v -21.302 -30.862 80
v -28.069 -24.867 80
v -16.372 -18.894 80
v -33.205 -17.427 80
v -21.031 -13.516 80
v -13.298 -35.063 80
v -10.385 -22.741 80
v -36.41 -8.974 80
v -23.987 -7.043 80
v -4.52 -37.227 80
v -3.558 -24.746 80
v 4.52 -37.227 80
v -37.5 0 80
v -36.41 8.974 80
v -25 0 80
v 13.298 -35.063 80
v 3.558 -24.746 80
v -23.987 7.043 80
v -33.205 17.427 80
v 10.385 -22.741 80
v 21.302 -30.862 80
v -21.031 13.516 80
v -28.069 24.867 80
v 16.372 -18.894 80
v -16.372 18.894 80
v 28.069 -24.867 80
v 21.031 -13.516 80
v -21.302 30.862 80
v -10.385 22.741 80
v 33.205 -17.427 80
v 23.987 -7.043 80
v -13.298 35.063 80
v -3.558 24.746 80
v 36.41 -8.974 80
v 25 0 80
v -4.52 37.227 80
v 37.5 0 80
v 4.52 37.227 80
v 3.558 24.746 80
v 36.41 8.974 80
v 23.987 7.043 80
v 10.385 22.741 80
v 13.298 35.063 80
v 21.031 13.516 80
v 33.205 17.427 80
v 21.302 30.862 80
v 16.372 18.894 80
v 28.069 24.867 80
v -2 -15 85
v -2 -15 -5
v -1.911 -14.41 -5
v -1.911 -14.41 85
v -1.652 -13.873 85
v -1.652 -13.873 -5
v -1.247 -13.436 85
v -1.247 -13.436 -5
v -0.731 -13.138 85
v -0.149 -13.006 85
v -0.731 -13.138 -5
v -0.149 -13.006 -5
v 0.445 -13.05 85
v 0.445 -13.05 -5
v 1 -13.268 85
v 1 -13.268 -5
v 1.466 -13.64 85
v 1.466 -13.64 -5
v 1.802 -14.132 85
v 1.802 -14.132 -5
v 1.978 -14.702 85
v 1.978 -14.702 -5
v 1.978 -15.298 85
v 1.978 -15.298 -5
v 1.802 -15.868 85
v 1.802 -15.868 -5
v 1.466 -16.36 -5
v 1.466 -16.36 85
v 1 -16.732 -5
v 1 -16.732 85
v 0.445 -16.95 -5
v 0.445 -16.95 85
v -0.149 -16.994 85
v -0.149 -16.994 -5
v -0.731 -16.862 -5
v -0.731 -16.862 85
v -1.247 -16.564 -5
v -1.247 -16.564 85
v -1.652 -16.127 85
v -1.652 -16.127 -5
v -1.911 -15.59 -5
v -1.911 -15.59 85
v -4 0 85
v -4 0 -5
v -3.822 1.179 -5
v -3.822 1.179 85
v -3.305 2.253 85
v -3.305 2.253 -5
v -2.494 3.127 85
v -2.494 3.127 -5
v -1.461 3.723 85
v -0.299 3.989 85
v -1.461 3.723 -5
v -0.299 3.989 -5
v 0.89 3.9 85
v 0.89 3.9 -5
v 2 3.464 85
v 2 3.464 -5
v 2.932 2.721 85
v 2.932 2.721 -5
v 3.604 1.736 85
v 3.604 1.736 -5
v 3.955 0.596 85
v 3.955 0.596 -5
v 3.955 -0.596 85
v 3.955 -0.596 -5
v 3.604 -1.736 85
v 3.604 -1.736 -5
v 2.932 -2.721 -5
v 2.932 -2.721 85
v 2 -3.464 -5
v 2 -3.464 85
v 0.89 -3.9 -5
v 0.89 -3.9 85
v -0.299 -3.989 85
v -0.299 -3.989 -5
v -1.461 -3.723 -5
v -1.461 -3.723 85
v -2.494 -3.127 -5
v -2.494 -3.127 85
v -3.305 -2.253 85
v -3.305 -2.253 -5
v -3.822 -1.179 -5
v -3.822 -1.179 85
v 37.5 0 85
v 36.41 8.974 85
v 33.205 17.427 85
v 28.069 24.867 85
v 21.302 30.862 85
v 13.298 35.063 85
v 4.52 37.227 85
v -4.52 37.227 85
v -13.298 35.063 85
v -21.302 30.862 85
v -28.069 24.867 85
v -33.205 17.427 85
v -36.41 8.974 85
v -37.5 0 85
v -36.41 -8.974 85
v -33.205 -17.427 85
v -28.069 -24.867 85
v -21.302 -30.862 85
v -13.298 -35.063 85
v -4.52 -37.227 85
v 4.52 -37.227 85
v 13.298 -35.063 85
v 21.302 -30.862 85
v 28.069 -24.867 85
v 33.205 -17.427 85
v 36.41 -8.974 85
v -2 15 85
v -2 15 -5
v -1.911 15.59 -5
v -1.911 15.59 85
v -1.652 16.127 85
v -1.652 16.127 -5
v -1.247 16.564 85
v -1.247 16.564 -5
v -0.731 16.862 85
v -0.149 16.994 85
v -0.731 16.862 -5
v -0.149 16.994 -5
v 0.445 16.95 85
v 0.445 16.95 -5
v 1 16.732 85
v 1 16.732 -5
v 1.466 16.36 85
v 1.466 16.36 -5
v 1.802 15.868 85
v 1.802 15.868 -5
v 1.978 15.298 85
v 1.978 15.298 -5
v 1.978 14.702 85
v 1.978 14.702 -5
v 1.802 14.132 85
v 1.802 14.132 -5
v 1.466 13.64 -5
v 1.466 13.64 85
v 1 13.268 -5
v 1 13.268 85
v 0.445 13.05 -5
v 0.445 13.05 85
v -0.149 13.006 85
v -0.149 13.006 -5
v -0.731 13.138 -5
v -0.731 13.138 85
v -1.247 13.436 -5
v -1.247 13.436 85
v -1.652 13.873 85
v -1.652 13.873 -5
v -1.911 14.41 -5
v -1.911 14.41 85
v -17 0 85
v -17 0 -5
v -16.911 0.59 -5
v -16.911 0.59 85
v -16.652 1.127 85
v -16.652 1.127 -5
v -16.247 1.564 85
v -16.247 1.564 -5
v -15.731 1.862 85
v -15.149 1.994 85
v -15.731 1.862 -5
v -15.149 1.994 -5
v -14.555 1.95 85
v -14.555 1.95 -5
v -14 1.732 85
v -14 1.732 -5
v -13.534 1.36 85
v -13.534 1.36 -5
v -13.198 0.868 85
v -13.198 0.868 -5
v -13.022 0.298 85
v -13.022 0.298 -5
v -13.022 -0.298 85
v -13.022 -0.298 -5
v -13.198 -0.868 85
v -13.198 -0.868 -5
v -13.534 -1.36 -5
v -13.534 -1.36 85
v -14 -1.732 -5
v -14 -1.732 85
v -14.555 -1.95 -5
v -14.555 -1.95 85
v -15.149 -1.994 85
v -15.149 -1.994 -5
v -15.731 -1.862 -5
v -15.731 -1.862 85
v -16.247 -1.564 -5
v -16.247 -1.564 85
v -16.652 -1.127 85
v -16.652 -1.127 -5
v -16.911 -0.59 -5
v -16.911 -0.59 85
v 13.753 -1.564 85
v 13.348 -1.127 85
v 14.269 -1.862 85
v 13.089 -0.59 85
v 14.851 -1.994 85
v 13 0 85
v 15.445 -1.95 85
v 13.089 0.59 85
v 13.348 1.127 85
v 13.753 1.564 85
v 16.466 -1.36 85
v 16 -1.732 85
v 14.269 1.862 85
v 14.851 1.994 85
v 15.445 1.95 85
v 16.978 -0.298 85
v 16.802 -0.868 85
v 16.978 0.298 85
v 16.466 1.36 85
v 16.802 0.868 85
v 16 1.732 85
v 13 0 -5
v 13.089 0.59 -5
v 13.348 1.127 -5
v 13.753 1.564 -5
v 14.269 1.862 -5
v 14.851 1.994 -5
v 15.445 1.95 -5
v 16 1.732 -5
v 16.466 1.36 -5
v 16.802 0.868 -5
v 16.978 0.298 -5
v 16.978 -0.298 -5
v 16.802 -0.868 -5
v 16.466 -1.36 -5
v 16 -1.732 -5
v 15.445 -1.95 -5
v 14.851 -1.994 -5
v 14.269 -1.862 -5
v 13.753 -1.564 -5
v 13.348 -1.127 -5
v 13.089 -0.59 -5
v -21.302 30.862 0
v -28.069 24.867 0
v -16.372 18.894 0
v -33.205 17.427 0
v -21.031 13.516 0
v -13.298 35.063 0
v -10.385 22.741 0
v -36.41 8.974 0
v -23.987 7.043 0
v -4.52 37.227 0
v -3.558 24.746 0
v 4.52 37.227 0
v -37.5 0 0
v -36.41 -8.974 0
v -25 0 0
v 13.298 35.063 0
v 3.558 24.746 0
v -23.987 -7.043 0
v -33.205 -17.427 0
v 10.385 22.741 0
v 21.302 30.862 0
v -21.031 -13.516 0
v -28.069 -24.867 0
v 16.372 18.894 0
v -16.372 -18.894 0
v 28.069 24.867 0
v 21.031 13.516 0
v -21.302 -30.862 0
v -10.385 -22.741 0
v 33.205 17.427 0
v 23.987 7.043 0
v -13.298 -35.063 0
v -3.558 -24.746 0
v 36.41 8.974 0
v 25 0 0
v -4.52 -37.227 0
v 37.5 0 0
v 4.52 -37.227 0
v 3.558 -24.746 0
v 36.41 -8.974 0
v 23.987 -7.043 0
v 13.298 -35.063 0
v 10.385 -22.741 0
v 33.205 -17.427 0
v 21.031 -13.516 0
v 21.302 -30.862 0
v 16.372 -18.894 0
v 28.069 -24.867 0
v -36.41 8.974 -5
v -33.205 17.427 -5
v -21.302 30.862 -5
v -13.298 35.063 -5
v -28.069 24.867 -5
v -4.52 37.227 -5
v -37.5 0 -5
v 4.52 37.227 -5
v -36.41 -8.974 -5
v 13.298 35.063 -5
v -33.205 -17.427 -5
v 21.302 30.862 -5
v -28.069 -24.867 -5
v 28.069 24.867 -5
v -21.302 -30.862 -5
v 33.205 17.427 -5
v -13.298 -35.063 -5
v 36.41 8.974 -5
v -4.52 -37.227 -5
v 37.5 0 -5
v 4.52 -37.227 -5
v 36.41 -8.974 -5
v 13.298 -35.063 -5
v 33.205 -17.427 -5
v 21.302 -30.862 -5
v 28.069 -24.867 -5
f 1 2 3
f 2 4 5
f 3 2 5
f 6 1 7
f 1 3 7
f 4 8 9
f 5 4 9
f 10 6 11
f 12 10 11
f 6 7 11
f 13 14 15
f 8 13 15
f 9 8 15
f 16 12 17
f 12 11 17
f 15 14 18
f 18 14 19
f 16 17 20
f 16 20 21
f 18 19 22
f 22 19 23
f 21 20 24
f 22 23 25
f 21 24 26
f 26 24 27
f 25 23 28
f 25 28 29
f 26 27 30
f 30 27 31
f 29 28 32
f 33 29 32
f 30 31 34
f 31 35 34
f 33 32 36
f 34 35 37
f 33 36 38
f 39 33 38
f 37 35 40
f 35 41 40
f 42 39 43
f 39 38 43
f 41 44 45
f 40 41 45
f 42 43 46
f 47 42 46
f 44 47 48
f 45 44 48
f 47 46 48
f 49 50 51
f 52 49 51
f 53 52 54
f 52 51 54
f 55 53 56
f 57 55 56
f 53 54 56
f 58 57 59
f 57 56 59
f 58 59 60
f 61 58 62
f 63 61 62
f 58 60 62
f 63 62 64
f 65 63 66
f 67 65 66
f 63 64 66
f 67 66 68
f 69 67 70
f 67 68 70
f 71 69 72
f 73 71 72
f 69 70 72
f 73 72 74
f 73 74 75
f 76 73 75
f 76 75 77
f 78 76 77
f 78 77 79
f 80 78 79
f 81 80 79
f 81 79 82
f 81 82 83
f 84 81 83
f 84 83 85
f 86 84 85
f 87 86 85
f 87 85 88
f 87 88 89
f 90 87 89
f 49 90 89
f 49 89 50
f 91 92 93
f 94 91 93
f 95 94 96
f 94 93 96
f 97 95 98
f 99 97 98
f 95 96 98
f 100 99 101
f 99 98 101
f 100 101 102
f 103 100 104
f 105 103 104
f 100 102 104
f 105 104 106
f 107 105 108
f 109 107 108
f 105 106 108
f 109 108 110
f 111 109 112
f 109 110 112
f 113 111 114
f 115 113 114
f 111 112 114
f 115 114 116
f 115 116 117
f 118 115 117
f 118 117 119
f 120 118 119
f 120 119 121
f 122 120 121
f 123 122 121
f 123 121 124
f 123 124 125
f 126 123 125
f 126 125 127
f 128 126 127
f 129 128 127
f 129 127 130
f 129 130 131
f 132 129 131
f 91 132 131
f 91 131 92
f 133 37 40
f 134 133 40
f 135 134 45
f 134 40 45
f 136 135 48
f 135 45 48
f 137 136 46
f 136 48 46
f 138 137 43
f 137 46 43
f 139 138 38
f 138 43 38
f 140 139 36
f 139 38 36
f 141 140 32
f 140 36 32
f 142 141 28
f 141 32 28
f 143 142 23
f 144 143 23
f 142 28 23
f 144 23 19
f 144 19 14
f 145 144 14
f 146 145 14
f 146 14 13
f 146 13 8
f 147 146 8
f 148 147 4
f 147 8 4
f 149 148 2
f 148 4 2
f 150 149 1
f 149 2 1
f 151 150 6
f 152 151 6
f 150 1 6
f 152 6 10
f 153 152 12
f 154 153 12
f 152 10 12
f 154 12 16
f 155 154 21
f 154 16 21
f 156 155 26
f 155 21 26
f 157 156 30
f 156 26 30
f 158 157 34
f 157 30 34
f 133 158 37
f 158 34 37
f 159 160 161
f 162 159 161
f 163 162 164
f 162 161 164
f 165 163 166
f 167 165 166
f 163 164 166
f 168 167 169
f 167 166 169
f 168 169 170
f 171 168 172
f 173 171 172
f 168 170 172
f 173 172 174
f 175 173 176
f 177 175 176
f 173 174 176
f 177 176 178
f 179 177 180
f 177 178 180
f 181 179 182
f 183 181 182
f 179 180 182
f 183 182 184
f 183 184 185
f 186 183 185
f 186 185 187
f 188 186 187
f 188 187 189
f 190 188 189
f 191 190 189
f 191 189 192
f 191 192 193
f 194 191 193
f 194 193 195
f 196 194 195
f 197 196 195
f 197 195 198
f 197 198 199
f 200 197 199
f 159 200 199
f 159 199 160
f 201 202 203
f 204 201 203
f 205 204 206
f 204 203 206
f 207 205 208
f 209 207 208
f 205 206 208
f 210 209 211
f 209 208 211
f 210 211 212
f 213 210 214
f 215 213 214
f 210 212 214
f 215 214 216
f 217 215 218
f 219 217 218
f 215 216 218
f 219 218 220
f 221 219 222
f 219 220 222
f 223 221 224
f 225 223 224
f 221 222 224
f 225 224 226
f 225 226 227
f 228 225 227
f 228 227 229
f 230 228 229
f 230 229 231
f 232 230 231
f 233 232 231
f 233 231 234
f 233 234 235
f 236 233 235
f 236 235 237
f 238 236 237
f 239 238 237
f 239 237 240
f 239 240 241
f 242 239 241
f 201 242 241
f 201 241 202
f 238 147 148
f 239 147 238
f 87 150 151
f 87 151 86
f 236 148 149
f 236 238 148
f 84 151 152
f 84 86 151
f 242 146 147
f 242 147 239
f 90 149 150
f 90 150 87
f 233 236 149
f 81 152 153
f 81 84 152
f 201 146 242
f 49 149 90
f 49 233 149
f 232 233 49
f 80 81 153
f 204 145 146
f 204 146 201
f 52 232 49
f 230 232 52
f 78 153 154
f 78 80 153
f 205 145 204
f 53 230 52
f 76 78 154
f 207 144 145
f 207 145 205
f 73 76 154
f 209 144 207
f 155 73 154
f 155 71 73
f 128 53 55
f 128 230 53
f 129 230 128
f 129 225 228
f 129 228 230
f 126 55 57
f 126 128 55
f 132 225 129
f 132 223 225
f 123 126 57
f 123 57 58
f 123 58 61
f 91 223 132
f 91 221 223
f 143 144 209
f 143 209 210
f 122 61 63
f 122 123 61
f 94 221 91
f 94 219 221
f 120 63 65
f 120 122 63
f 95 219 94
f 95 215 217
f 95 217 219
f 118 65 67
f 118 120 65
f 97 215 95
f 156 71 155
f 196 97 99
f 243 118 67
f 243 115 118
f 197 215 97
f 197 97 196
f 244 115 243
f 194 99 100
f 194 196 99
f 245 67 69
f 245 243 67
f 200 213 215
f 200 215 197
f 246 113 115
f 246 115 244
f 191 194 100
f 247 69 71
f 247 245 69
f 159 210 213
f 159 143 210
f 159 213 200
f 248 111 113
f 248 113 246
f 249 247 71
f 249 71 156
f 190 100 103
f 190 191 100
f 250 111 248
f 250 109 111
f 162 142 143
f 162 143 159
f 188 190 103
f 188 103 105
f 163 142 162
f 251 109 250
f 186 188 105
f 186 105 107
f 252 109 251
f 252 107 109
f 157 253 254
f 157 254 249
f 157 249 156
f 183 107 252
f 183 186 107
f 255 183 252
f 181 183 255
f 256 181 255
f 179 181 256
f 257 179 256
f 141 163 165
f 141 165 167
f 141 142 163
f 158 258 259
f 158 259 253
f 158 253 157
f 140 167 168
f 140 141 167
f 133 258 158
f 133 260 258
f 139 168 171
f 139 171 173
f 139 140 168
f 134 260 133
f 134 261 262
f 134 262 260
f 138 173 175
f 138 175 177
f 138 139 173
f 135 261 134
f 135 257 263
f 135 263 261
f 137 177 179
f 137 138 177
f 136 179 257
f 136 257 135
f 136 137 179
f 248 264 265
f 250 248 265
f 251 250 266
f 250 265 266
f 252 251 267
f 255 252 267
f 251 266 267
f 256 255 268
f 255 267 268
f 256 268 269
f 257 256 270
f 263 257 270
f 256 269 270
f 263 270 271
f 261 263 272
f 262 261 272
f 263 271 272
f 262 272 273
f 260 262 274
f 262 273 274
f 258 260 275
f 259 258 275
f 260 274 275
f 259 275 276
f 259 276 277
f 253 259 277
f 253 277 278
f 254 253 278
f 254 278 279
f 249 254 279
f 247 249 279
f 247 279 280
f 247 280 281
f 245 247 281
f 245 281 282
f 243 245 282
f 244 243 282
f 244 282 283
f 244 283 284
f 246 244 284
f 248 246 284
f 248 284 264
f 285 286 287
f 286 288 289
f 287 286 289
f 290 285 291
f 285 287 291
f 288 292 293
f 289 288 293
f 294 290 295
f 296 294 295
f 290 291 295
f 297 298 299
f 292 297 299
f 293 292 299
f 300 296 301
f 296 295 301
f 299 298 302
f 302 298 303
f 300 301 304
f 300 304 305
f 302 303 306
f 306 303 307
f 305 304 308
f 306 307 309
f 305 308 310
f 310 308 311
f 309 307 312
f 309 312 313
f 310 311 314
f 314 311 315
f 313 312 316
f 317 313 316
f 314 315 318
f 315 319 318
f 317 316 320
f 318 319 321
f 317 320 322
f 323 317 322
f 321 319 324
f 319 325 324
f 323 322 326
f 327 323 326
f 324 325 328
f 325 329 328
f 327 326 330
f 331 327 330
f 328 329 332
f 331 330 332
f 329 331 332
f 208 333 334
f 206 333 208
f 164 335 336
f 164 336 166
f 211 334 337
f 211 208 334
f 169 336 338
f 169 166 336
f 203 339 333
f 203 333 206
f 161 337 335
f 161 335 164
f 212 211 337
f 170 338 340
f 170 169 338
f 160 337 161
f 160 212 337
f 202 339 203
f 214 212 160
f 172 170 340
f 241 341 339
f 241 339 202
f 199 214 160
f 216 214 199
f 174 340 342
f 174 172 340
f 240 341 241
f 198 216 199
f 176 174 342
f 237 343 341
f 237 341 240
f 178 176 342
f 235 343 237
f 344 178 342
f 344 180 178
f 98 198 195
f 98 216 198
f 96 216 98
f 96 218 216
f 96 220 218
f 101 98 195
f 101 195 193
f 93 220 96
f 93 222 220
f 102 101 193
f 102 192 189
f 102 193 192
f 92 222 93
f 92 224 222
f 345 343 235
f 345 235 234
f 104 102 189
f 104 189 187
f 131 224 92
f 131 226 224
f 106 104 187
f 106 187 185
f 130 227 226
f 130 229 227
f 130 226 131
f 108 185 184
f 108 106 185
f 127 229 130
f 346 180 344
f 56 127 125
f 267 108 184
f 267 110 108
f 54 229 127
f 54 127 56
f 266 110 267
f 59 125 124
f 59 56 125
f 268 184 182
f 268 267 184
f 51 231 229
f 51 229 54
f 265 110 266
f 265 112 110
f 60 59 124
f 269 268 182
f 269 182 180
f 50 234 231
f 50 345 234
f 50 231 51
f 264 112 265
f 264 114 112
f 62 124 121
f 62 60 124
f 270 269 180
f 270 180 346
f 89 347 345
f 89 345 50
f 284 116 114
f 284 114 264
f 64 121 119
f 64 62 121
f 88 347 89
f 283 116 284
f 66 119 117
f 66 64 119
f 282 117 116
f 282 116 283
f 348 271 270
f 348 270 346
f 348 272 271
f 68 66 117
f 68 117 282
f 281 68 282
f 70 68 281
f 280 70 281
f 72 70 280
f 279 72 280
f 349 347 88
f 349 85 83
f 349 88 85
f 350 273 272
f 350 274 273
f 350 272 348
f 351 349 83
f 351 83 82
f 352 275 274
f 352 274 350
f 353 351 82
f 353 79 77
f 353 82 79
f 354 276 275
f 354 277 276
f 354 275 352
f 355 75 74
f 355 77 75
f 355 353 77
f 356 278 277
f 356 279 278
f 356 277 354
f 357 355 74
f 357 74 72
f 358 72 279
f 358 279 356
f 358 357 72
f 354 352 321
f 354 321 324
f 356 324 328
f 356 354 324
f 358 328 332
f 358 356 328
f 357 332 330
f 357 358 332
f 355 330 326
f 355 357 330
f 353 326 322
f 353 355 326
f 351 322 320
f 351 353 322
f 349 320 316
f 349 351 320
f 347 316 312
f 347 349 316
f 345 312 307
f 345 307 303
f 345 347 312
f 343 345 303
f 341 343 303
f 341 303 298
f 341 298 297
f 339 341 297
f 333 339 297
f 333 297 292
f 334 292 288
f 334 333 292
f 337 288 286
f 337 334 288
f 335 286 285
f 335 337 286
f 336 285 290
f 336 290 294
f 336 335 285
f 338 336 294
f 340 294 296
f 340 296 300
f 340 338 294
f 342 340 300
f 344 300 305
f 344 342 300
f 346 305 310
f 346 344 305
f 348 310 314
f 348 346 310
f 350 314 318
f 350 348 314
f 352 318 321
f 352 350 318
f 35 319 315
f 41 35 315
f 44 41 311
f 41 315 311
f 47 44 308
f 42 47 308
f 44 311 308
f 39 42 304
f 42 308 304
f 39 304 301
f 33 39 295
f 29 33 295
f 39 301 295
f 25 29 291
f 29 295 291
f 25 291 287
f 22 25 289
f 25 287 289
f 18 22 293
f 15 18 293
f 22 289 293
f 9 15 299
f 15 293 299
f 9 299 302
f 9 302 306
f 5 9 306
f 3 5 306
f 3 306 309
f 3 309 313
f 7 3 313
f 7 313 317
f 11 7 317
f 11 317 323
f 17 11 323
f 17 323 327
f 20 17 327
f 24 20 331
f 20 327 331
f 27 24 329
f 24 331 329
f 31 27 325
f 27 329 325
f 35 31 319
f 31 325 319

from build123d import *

# Parameters (mm, degrees)
SKETCH1_R           = 25
BOSS_EXTRUDE1_DEPTH = 80
SKETCH2_R           = 37.5
BOSS_EXTRUDE2_DEPTH = 5
BOSS_EXTRUDE3_START = 5
SKETCH3_R           = 37.5
BOSS_EXTRUDE3_DEPTH = 5
SKETCH4_R           = 4
SKETCH4_R_2         = 2
CUT_EXTRUDE1_DEPTH  = 105.462912079


with BuildPart() as part:
    # Sketch1 → Boss-Extrude1 (new body)
    with BuildSketch(Plane.XY):
        Circle(SKETCH1_R)
    extrude(amount=BOSS_EXTRUDE1_DEPTH)

    # Sketch2 → Boss-Extrude2 (add)
    with BuildSketch(Plane.XY.offset(80)):
        Circle(SKETCH2_R)
    extrude(amount=BOSS_EXTRUDE2_DEPTH)

    # Sketch3 → Boss-Extrude3 (add)
    with BuildSketch(Plane(origin=(0, 0, 0), x_dir=(-1, 0, 0), z_dir=(0, 0, -1)).offset(BOSS_EXTRUDE3_START)):
        with Locations(Location((0, 0, 0), (0, 0, 180))):
            Circle(SKETCH3_R)
    extrude(amount=-BOSS_EXTRUDE3_DEPTH)

    # Sketch4 → Cut-Extrude1 (cut, through all)
    with BuildSketch(Plane(origin=(0, 0, -5), x_dir=(-1, 0, 0), z_dir=(0, 0, -1))):
        Circle(SKETCH4_R)
        with Locations((0, 15)):
            Circle(SKETCH4_R_2)
        with Locations((15, 0)):
            Circle(SKETCH4_R_2)
        with Locations((0, -15)):
            Circle(SKETCH4_R_2)
        with Locations((-15, 0)):
            Circle(SKETCH4_R_2)
    extrude(amount=-CUT_EXTRUDE1_DEPTH, mode=Mode.SUBTRACT)


solid = part.part
